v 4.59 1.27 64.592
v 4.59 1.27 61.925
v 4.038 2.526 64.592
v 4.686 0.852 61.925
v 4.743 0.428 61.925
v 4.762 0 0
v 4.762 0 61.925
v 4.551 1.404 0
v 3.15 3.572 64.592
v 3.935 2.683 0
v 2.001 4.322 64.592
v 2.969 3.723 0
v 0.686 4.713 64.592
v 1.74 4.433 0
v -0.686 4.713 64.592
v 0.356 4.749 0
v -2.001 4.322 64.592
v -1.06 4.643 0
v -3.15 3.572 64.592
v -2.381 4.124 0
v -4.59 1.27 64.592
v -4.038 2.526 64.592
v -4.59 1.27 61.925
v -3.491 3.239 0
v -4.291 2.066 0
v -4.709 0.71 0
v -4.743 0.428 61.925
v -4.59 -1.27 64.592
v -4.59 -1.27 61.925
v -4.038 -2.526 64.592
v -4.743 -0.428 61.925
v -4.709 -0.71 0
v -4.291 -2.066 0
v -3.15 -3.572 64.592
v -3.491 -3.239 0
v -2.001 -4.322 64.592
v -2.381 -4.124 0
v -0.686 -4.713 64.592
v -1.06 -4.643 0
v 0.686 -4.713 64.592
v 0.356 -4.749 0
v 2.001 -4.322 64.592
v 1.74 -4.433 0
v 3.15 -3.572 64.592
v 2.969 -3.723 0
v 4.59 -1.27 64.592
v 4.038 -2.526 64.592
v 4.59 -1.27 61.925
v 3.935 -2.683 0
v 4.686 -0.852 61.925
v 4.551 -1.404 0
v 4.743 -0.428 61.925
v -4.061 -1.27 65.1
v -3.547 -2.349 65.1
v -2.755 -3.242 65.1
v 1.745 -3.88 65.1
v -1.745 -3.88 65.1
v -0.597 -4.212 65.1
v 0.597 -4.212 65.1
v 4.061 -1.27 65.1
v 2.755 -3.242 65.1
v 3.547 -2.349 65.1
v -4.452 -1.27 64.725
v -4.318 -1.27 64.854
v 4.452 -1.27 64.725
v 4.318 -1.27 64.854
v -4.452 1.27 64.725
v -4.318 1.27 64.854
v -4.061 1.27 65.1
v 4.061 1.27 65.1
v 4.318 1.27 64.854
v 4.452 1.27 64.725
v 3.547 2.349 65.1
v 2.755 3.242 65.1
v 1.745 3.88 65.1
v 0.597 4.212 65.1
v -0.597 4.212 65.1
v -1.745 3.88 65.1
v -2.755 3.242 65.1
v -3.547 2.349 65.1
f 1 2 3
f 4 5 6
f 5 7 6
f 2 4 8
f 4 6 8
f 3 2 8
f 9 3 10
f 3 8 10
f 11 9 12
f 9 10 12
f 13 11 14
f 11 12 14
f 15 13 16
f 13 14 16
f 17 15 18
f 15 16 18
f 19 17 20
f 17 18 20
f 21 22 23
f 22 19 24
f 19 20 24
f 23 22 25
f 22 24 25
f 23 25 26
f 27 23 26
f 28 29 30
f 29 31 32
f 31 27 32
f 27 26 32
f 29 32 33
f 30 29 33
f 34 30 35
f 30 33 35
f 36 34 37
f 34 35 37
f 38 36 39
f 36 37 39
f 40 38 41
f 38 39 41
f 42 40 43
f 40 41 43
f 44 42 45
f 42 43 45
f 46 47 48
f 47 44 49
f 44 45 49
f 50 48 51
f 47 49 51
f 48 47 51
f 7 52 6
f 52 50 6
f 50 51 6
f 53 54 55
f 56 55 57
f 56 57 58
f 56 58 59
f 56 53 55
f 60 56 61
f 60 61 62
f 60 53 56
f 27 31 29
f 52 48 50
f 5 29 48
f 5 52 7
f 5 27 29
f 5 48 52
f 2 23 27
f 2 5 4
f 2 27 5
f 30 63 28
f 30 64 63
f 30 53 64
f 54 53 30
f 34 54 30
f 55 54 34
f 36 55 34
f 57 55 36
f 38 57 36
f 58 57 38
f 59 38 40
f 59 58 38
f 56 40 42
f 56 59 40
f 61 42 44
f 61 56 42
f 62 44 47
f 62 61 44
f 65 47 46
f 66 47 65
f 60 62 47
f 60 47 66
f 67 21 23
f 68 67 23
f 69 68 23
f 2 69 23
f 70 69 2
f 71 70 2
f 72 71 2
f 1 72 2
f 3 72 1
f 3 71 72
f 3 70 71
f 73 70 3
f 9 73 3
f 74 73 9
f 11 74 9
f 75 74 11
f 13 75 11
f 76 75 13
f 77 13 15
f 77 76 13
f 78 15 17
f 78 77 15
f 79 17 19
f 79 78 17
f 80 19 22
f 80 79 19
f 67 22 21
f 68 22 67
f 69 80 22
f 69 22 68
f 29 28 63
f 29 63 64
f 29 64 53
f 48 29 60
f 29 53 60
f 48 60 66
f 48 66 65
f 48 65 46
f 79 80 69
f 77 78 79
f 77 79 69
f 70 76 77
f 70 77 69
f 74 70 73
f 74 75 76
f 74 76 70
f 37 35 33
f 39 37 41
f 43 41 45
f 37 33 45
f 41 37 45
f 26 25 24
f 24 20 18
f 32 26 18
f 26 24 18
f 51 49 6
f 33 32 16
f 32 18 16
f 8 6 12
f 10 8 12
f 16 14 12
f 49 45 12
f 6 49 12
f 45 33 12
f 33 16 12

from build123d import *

# Parameters (mm, degrees)
SKETCH1_R           = 4.7625
BOSS_EXTRUDE1_DEPTH = 65.1002
SKETCH2_W           = 9.525
SKETCH2_H           = 2.54
CUT_EXTRUDE1_DEPTH  = 3.175
CHAMFER1_SIZE       = 0.508


with BuildPart() as part:
    # Sketch1 → Boss-Extrude1 (new body)
    with BuildSketch(Plane.XY):
        Circle(SKETCH1_R)
    extrude(amount=BOSS_EXTRUDE1_DEPTH)

    # Sketch2 → Cut-Extrude1 (cut)
    with BuildSketch(Plane.XY.offset(65.1002)):
        Rectangle(SKETCH2_W, SKETCH2_H)
    extrude(amount=-CUT_EXTRUDE1_DEPTH, mode=Mode.SUBTRACT)

    # Chamfer1
    chamfer1_edges = [part.edges().sort_by_distance(p)[0] for p in [
        (0, 4.7625, 65.1002),
        (0, -4.7625, 65.1002),
    ]]
    chamfer(chamfer1_edges, length=CHAMFER1_SIZE)


solid = part.part
